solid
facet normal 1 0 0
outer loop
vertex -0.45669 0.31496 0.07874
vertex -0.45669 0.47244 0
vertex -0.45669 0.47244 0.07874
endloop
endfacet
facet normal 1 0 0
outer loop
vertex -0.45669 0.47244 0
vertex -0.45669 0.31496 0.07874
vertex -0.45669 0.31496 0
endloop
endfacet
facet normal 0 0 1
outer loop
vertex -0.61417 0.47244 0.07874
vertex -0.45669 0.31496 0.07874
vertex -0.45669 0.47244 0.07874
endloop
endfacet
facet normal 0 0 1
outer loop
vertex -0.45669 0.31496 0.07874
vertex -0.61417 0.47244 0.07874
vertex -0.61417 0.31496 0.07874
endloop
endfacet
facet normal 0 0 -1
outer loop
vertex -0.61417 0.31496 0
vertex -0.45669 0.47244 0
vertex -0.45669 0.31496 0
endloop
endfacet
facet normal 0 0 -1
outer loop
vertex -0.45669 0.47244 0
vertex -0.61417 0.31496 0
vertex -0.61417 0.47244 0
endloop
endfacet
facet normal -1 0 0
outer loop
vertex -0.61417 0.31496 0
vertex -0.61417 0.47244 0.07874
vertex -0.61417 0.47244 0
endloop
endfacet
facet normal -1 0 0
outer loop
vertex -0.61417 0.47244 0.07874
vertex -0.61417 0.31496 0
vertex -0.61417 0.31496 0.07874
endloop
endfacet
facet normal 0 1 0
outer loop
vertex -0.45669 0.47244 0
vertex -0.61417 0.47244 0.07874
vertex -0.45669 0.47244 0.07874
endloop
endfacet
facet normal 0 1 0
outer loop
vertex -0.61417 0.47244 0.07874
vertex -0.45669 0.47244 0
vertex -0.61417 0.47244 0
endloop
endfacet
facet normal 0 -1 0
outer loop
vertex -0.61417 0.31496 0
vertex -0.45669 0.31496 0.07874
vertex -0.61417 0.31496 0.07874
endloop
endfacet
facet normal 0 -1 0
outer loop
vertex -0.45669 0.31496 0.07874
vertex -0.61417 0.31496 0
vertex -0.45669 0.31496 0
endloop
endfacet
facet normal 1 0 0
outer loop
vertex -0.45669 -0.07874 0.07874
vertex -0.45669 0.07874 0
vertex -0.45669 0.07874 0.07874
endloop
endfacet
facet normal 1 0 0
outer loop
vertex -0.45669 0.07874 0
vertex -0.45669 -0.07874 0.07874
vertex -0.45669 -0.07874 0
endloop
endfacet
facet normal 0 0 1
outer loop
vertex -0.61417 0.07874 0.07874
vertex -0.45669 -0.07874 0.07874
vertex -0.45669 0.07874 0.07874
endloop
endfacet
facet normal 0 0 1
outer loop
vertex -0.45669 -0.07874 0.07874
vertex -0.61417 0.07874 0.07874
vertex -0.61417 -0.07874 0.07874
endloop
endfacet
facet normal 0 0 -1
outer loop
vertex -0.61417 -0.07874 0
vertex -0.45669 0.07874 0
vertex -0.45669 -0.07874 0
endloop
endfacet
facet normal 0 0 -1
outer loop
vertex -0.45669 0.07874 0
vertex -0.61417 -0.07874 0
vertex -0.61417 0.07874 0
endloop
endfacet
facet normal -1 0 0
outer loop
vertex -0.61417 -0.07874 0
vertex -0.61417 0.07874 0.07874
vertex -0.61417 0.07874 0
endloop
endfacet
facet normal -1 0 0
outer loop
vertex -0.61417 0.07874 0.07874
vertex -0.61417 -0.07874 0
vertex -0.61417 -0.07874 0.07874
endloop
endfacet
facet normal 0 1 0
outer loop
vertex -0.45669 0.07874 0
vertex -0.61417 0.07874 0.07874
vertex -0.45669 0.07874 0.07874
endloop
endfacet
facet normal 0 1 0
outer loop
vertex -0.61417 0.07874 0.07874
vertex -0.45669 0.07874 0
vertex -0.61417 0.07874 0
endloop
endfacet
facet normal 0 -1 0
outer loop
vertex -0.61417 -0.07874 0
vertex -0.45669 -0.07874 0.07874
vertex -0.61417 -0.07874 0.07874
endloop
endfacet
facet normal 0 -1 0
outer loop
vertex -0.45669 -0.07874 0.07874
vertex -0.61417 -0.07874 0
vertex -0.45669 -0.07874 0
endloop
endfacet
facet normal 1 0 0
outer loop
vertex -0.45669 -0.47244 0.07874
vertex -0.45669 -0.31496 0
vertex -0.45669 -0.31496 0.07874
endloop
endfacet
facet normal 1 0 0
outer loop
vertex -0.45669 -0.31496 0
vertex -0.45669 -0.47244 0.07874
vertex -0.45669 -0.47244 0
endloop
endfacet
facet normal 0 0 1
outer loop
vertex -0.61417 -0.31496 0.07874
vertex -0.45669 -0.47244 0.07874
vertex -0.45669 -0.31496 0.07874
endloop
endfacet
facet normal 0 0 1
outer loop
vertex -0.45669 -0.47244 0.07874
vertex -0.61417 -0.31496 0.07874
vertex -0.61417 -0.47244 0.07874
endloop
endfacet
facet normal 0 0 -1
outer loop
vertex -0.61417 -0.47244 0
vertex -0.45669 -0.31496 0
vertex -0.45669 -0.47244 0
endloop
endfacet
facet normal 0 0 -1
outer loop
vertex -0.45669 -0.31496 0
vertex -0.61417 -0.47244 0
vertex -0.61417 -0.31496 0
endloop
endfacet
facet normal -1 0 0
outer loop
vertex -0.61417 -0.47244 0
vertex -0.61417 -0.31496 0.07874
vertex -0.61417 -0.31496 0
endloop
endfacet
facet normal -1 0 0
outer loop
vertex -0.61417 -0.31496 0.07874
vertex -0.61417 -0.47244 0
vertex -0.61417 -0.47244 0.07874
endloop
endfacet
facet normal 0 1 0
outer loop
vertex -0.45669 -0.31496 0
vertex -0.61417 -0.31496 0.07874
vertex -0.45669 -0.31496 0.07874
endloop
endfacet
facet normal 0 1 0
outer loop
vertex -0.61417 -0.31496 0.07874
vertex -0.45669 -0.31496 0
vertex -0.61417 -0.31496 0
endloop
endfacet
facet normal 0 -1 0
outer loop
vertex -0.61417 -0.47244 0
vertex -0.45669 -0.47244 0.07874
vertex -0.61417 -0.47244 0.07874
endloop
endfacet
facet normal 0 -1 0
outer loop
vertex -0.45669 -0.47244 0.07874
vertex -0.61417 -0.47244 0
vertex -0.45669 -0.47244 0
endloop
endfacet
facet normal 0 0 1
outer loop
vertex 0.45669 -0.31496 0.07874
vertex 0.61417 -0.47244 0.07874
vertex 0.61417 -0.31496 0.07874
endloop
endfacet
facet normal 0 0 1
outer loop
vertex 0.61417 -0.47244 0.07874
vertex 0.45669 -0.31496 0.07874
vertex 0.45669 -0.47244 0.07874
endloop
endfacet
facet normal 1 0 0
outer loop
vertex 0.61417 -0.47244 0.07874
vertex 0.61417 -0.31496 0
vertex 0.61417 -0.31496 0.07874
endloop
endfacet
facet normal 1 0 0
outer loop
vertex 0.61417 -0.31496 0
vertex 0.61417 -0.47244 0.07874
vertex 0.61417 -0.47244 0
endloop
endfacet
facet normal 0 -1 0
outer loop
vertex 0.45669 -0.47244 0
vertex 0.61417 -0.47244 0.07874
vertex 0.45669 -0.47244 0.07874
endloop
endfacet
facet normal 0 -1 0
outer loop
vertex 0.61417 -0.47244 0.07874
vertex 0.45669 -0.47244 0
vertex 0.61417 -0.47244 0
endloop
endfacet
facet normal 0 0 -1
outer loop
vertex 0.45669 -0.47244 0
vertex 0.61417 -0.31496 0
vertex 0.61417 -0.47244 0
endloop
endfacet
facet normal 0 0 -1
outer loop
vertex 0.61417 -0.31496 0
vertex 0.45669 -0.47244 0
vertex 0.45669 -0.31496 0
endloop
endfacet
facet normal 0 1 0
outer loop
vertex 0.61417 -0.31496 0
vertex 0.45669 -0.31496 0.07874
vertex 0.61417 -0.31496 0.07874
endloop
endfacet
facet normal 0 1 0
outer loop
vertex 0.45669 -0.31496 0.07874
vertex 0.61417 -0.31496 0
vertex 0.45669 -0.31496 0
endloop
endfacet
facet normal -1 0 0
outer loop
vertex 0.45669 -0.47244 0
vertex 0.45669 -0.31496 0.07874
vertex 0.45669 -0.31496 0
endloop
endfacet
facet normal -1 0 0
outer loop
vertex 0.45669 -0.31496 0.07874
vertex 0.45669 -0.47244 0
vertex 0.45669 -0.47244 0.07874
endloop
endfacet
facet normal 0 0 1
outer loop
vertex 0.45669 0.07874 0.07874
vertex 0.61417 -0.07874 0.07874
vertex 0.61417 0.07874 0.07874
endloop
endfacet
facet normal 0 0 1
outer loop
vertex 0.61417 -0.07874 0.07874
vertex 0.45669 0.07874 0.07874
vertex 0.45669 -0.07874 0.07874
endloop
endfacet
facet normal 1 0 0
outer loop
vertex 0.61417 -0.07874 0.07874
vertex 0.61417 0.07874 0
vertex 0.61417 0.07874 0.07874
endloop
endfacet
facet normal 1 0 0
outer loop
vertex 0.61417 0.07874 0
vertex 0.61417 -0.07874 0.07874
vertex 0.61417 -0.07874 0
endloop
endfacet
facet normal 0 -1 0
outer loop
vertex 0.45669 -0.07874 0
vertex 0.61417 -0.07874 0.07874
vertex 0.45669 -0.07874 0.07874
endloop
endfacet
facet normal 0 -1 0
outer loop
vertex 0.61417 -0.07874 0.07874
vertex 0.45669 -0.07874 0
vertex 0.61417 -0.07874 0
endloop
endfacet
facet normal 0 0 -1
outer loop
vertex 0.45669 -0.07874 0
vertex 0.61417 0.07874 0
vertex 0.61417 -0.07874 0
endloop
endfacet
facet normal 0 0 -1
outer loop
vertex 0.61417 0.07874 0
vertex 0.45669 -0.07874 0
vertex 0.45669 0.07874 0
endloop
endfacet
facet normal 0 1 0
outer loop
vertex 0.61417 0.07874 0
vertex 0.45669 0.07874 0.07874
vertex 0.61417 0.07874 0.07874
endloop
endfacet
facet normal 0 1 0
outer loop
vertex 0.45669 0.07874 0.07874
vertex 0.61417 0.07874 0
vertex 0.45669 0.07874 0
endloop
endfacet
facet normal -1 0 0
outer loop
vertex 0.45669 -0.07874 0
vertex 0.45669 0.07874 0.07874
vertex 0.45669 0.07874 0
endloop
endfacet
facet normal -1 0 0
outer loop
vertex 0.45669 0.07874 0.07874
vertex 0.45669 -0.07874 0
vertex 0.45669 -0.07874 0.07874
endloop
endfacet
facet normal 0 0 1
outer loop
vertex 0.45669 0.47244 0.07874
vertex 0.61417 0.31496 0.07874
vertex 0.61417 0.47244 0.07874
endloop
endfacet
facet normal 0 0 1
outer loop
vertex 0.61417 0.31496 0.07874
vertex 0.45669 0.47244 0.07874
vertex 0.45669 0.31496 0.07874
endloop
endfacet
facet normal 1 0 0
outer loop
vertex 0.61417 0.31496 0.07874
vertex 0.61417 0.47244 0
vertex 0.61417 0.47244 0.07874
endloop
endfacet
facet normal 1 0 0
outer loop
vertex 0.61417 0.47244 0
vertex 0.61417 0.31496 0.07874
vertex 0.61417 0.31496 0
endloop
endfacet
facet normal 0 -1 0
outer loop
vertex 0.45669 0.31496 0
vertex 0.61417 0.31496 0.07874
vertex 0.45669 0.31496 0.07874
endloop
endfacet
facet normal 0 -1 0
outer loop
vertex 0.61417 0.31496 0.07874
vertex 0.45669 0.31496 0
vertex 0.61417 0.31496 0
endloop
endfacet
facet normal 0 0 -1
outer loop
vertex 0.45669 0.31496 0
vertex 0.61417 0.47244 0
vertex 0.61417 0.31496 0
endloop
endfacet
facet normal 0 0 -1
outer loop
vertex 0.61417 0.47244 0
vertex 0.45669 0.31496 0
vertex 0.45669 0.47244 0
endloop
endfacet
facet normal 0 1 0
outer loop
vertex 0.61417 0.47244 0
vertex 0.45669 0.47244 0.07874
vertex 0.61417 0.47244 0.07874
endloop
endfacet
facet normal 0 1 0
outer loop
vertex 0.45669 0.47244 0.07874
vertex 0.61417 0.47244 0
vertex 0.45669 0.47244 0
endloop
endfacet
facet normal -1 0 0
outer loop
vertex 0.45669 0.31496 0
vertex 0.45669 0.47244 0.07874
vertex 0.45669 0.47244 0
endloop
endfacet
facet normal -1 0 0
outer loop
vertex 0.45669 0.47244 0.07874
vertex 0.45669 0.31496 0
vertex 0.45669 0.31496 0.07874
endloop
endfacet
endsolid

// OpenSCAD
// file: defines.scad
L = 3.1;  // Длина
W = 3.1;  // Ширина
H = 0.8;  // Высота (от платы, с выводами)
Hf = 0.04;  // Возвышение над платой (высота выводов)
e = 0.5;    // Шаг выводов

pin_fragments = 16;

scale = 1/2.54;
// main file
include <defines.scad>

p_w = 0.567;
p_h = 0.4;

p_co = 1.55 - 3*p_h/2 + 0.02;

module Pin(x, y, z, r) {
color("Gold")
  rotate([0,0,r]) translate([x,y,z])
  union() {
    /*Упрощенный вид ног*/
    /*cube(size = [p_w, p_h, Hf],center=true);*/
    /*Оригинальная форма*/
    /*translate([-0.04,0,0.0]) cube(size = [0.4, 0.3, Hf], center=true);
    translate([ 0.14,0,0.0]) cylinder(r = p_h/2, h = Hf, $fn = 64, center=true);
    translate([-0.23,0.1,0.0]) cylinder(r = 0.05, h = Hf, $fn = 64, center=true);
    translate([-0.23,-0.1,0.0]) cylinder(r = 0.05, h = Hf, $fn = 64, center=true);
    translate([-0.23,0,0]) cube(size = [0.1, 0.2, Hf],center=true);*/

    translate([-0.39, 0, 0.1]) cube(size = [p_h, p_h, 0.2],center=true); // На боковине
  }
}

scale(scale)
  union() {
    Pin(-p_co, 1.0, 0, 0); // #1
    Pin(-p_co, 0.0, 0, 0); // #2
    Pin(-p_co,-1.0, 0, 0); // #3

    /*Pin(-p_co, 0.5, 0, 90); // #6
    Pin(-p_co, 0.0, 0, 90); // #7
    Pin(-p_co,-0.5, 0, 90); // #8*/

    Pin(-p_co, 1.0, 0, 180); // #4
    Pin(-p_co, 0.0, 0, 180); // #5
    Pin(-p_co,-1.0, 0, 180); // #6

    /*Pin(-p_co, 0.5, 0, 270); // #14
    Pin(-p_co, 0.0, 0, 270); // #15
    Pin(-p_co,-0.5, 0, 270); // #16*/

  };
